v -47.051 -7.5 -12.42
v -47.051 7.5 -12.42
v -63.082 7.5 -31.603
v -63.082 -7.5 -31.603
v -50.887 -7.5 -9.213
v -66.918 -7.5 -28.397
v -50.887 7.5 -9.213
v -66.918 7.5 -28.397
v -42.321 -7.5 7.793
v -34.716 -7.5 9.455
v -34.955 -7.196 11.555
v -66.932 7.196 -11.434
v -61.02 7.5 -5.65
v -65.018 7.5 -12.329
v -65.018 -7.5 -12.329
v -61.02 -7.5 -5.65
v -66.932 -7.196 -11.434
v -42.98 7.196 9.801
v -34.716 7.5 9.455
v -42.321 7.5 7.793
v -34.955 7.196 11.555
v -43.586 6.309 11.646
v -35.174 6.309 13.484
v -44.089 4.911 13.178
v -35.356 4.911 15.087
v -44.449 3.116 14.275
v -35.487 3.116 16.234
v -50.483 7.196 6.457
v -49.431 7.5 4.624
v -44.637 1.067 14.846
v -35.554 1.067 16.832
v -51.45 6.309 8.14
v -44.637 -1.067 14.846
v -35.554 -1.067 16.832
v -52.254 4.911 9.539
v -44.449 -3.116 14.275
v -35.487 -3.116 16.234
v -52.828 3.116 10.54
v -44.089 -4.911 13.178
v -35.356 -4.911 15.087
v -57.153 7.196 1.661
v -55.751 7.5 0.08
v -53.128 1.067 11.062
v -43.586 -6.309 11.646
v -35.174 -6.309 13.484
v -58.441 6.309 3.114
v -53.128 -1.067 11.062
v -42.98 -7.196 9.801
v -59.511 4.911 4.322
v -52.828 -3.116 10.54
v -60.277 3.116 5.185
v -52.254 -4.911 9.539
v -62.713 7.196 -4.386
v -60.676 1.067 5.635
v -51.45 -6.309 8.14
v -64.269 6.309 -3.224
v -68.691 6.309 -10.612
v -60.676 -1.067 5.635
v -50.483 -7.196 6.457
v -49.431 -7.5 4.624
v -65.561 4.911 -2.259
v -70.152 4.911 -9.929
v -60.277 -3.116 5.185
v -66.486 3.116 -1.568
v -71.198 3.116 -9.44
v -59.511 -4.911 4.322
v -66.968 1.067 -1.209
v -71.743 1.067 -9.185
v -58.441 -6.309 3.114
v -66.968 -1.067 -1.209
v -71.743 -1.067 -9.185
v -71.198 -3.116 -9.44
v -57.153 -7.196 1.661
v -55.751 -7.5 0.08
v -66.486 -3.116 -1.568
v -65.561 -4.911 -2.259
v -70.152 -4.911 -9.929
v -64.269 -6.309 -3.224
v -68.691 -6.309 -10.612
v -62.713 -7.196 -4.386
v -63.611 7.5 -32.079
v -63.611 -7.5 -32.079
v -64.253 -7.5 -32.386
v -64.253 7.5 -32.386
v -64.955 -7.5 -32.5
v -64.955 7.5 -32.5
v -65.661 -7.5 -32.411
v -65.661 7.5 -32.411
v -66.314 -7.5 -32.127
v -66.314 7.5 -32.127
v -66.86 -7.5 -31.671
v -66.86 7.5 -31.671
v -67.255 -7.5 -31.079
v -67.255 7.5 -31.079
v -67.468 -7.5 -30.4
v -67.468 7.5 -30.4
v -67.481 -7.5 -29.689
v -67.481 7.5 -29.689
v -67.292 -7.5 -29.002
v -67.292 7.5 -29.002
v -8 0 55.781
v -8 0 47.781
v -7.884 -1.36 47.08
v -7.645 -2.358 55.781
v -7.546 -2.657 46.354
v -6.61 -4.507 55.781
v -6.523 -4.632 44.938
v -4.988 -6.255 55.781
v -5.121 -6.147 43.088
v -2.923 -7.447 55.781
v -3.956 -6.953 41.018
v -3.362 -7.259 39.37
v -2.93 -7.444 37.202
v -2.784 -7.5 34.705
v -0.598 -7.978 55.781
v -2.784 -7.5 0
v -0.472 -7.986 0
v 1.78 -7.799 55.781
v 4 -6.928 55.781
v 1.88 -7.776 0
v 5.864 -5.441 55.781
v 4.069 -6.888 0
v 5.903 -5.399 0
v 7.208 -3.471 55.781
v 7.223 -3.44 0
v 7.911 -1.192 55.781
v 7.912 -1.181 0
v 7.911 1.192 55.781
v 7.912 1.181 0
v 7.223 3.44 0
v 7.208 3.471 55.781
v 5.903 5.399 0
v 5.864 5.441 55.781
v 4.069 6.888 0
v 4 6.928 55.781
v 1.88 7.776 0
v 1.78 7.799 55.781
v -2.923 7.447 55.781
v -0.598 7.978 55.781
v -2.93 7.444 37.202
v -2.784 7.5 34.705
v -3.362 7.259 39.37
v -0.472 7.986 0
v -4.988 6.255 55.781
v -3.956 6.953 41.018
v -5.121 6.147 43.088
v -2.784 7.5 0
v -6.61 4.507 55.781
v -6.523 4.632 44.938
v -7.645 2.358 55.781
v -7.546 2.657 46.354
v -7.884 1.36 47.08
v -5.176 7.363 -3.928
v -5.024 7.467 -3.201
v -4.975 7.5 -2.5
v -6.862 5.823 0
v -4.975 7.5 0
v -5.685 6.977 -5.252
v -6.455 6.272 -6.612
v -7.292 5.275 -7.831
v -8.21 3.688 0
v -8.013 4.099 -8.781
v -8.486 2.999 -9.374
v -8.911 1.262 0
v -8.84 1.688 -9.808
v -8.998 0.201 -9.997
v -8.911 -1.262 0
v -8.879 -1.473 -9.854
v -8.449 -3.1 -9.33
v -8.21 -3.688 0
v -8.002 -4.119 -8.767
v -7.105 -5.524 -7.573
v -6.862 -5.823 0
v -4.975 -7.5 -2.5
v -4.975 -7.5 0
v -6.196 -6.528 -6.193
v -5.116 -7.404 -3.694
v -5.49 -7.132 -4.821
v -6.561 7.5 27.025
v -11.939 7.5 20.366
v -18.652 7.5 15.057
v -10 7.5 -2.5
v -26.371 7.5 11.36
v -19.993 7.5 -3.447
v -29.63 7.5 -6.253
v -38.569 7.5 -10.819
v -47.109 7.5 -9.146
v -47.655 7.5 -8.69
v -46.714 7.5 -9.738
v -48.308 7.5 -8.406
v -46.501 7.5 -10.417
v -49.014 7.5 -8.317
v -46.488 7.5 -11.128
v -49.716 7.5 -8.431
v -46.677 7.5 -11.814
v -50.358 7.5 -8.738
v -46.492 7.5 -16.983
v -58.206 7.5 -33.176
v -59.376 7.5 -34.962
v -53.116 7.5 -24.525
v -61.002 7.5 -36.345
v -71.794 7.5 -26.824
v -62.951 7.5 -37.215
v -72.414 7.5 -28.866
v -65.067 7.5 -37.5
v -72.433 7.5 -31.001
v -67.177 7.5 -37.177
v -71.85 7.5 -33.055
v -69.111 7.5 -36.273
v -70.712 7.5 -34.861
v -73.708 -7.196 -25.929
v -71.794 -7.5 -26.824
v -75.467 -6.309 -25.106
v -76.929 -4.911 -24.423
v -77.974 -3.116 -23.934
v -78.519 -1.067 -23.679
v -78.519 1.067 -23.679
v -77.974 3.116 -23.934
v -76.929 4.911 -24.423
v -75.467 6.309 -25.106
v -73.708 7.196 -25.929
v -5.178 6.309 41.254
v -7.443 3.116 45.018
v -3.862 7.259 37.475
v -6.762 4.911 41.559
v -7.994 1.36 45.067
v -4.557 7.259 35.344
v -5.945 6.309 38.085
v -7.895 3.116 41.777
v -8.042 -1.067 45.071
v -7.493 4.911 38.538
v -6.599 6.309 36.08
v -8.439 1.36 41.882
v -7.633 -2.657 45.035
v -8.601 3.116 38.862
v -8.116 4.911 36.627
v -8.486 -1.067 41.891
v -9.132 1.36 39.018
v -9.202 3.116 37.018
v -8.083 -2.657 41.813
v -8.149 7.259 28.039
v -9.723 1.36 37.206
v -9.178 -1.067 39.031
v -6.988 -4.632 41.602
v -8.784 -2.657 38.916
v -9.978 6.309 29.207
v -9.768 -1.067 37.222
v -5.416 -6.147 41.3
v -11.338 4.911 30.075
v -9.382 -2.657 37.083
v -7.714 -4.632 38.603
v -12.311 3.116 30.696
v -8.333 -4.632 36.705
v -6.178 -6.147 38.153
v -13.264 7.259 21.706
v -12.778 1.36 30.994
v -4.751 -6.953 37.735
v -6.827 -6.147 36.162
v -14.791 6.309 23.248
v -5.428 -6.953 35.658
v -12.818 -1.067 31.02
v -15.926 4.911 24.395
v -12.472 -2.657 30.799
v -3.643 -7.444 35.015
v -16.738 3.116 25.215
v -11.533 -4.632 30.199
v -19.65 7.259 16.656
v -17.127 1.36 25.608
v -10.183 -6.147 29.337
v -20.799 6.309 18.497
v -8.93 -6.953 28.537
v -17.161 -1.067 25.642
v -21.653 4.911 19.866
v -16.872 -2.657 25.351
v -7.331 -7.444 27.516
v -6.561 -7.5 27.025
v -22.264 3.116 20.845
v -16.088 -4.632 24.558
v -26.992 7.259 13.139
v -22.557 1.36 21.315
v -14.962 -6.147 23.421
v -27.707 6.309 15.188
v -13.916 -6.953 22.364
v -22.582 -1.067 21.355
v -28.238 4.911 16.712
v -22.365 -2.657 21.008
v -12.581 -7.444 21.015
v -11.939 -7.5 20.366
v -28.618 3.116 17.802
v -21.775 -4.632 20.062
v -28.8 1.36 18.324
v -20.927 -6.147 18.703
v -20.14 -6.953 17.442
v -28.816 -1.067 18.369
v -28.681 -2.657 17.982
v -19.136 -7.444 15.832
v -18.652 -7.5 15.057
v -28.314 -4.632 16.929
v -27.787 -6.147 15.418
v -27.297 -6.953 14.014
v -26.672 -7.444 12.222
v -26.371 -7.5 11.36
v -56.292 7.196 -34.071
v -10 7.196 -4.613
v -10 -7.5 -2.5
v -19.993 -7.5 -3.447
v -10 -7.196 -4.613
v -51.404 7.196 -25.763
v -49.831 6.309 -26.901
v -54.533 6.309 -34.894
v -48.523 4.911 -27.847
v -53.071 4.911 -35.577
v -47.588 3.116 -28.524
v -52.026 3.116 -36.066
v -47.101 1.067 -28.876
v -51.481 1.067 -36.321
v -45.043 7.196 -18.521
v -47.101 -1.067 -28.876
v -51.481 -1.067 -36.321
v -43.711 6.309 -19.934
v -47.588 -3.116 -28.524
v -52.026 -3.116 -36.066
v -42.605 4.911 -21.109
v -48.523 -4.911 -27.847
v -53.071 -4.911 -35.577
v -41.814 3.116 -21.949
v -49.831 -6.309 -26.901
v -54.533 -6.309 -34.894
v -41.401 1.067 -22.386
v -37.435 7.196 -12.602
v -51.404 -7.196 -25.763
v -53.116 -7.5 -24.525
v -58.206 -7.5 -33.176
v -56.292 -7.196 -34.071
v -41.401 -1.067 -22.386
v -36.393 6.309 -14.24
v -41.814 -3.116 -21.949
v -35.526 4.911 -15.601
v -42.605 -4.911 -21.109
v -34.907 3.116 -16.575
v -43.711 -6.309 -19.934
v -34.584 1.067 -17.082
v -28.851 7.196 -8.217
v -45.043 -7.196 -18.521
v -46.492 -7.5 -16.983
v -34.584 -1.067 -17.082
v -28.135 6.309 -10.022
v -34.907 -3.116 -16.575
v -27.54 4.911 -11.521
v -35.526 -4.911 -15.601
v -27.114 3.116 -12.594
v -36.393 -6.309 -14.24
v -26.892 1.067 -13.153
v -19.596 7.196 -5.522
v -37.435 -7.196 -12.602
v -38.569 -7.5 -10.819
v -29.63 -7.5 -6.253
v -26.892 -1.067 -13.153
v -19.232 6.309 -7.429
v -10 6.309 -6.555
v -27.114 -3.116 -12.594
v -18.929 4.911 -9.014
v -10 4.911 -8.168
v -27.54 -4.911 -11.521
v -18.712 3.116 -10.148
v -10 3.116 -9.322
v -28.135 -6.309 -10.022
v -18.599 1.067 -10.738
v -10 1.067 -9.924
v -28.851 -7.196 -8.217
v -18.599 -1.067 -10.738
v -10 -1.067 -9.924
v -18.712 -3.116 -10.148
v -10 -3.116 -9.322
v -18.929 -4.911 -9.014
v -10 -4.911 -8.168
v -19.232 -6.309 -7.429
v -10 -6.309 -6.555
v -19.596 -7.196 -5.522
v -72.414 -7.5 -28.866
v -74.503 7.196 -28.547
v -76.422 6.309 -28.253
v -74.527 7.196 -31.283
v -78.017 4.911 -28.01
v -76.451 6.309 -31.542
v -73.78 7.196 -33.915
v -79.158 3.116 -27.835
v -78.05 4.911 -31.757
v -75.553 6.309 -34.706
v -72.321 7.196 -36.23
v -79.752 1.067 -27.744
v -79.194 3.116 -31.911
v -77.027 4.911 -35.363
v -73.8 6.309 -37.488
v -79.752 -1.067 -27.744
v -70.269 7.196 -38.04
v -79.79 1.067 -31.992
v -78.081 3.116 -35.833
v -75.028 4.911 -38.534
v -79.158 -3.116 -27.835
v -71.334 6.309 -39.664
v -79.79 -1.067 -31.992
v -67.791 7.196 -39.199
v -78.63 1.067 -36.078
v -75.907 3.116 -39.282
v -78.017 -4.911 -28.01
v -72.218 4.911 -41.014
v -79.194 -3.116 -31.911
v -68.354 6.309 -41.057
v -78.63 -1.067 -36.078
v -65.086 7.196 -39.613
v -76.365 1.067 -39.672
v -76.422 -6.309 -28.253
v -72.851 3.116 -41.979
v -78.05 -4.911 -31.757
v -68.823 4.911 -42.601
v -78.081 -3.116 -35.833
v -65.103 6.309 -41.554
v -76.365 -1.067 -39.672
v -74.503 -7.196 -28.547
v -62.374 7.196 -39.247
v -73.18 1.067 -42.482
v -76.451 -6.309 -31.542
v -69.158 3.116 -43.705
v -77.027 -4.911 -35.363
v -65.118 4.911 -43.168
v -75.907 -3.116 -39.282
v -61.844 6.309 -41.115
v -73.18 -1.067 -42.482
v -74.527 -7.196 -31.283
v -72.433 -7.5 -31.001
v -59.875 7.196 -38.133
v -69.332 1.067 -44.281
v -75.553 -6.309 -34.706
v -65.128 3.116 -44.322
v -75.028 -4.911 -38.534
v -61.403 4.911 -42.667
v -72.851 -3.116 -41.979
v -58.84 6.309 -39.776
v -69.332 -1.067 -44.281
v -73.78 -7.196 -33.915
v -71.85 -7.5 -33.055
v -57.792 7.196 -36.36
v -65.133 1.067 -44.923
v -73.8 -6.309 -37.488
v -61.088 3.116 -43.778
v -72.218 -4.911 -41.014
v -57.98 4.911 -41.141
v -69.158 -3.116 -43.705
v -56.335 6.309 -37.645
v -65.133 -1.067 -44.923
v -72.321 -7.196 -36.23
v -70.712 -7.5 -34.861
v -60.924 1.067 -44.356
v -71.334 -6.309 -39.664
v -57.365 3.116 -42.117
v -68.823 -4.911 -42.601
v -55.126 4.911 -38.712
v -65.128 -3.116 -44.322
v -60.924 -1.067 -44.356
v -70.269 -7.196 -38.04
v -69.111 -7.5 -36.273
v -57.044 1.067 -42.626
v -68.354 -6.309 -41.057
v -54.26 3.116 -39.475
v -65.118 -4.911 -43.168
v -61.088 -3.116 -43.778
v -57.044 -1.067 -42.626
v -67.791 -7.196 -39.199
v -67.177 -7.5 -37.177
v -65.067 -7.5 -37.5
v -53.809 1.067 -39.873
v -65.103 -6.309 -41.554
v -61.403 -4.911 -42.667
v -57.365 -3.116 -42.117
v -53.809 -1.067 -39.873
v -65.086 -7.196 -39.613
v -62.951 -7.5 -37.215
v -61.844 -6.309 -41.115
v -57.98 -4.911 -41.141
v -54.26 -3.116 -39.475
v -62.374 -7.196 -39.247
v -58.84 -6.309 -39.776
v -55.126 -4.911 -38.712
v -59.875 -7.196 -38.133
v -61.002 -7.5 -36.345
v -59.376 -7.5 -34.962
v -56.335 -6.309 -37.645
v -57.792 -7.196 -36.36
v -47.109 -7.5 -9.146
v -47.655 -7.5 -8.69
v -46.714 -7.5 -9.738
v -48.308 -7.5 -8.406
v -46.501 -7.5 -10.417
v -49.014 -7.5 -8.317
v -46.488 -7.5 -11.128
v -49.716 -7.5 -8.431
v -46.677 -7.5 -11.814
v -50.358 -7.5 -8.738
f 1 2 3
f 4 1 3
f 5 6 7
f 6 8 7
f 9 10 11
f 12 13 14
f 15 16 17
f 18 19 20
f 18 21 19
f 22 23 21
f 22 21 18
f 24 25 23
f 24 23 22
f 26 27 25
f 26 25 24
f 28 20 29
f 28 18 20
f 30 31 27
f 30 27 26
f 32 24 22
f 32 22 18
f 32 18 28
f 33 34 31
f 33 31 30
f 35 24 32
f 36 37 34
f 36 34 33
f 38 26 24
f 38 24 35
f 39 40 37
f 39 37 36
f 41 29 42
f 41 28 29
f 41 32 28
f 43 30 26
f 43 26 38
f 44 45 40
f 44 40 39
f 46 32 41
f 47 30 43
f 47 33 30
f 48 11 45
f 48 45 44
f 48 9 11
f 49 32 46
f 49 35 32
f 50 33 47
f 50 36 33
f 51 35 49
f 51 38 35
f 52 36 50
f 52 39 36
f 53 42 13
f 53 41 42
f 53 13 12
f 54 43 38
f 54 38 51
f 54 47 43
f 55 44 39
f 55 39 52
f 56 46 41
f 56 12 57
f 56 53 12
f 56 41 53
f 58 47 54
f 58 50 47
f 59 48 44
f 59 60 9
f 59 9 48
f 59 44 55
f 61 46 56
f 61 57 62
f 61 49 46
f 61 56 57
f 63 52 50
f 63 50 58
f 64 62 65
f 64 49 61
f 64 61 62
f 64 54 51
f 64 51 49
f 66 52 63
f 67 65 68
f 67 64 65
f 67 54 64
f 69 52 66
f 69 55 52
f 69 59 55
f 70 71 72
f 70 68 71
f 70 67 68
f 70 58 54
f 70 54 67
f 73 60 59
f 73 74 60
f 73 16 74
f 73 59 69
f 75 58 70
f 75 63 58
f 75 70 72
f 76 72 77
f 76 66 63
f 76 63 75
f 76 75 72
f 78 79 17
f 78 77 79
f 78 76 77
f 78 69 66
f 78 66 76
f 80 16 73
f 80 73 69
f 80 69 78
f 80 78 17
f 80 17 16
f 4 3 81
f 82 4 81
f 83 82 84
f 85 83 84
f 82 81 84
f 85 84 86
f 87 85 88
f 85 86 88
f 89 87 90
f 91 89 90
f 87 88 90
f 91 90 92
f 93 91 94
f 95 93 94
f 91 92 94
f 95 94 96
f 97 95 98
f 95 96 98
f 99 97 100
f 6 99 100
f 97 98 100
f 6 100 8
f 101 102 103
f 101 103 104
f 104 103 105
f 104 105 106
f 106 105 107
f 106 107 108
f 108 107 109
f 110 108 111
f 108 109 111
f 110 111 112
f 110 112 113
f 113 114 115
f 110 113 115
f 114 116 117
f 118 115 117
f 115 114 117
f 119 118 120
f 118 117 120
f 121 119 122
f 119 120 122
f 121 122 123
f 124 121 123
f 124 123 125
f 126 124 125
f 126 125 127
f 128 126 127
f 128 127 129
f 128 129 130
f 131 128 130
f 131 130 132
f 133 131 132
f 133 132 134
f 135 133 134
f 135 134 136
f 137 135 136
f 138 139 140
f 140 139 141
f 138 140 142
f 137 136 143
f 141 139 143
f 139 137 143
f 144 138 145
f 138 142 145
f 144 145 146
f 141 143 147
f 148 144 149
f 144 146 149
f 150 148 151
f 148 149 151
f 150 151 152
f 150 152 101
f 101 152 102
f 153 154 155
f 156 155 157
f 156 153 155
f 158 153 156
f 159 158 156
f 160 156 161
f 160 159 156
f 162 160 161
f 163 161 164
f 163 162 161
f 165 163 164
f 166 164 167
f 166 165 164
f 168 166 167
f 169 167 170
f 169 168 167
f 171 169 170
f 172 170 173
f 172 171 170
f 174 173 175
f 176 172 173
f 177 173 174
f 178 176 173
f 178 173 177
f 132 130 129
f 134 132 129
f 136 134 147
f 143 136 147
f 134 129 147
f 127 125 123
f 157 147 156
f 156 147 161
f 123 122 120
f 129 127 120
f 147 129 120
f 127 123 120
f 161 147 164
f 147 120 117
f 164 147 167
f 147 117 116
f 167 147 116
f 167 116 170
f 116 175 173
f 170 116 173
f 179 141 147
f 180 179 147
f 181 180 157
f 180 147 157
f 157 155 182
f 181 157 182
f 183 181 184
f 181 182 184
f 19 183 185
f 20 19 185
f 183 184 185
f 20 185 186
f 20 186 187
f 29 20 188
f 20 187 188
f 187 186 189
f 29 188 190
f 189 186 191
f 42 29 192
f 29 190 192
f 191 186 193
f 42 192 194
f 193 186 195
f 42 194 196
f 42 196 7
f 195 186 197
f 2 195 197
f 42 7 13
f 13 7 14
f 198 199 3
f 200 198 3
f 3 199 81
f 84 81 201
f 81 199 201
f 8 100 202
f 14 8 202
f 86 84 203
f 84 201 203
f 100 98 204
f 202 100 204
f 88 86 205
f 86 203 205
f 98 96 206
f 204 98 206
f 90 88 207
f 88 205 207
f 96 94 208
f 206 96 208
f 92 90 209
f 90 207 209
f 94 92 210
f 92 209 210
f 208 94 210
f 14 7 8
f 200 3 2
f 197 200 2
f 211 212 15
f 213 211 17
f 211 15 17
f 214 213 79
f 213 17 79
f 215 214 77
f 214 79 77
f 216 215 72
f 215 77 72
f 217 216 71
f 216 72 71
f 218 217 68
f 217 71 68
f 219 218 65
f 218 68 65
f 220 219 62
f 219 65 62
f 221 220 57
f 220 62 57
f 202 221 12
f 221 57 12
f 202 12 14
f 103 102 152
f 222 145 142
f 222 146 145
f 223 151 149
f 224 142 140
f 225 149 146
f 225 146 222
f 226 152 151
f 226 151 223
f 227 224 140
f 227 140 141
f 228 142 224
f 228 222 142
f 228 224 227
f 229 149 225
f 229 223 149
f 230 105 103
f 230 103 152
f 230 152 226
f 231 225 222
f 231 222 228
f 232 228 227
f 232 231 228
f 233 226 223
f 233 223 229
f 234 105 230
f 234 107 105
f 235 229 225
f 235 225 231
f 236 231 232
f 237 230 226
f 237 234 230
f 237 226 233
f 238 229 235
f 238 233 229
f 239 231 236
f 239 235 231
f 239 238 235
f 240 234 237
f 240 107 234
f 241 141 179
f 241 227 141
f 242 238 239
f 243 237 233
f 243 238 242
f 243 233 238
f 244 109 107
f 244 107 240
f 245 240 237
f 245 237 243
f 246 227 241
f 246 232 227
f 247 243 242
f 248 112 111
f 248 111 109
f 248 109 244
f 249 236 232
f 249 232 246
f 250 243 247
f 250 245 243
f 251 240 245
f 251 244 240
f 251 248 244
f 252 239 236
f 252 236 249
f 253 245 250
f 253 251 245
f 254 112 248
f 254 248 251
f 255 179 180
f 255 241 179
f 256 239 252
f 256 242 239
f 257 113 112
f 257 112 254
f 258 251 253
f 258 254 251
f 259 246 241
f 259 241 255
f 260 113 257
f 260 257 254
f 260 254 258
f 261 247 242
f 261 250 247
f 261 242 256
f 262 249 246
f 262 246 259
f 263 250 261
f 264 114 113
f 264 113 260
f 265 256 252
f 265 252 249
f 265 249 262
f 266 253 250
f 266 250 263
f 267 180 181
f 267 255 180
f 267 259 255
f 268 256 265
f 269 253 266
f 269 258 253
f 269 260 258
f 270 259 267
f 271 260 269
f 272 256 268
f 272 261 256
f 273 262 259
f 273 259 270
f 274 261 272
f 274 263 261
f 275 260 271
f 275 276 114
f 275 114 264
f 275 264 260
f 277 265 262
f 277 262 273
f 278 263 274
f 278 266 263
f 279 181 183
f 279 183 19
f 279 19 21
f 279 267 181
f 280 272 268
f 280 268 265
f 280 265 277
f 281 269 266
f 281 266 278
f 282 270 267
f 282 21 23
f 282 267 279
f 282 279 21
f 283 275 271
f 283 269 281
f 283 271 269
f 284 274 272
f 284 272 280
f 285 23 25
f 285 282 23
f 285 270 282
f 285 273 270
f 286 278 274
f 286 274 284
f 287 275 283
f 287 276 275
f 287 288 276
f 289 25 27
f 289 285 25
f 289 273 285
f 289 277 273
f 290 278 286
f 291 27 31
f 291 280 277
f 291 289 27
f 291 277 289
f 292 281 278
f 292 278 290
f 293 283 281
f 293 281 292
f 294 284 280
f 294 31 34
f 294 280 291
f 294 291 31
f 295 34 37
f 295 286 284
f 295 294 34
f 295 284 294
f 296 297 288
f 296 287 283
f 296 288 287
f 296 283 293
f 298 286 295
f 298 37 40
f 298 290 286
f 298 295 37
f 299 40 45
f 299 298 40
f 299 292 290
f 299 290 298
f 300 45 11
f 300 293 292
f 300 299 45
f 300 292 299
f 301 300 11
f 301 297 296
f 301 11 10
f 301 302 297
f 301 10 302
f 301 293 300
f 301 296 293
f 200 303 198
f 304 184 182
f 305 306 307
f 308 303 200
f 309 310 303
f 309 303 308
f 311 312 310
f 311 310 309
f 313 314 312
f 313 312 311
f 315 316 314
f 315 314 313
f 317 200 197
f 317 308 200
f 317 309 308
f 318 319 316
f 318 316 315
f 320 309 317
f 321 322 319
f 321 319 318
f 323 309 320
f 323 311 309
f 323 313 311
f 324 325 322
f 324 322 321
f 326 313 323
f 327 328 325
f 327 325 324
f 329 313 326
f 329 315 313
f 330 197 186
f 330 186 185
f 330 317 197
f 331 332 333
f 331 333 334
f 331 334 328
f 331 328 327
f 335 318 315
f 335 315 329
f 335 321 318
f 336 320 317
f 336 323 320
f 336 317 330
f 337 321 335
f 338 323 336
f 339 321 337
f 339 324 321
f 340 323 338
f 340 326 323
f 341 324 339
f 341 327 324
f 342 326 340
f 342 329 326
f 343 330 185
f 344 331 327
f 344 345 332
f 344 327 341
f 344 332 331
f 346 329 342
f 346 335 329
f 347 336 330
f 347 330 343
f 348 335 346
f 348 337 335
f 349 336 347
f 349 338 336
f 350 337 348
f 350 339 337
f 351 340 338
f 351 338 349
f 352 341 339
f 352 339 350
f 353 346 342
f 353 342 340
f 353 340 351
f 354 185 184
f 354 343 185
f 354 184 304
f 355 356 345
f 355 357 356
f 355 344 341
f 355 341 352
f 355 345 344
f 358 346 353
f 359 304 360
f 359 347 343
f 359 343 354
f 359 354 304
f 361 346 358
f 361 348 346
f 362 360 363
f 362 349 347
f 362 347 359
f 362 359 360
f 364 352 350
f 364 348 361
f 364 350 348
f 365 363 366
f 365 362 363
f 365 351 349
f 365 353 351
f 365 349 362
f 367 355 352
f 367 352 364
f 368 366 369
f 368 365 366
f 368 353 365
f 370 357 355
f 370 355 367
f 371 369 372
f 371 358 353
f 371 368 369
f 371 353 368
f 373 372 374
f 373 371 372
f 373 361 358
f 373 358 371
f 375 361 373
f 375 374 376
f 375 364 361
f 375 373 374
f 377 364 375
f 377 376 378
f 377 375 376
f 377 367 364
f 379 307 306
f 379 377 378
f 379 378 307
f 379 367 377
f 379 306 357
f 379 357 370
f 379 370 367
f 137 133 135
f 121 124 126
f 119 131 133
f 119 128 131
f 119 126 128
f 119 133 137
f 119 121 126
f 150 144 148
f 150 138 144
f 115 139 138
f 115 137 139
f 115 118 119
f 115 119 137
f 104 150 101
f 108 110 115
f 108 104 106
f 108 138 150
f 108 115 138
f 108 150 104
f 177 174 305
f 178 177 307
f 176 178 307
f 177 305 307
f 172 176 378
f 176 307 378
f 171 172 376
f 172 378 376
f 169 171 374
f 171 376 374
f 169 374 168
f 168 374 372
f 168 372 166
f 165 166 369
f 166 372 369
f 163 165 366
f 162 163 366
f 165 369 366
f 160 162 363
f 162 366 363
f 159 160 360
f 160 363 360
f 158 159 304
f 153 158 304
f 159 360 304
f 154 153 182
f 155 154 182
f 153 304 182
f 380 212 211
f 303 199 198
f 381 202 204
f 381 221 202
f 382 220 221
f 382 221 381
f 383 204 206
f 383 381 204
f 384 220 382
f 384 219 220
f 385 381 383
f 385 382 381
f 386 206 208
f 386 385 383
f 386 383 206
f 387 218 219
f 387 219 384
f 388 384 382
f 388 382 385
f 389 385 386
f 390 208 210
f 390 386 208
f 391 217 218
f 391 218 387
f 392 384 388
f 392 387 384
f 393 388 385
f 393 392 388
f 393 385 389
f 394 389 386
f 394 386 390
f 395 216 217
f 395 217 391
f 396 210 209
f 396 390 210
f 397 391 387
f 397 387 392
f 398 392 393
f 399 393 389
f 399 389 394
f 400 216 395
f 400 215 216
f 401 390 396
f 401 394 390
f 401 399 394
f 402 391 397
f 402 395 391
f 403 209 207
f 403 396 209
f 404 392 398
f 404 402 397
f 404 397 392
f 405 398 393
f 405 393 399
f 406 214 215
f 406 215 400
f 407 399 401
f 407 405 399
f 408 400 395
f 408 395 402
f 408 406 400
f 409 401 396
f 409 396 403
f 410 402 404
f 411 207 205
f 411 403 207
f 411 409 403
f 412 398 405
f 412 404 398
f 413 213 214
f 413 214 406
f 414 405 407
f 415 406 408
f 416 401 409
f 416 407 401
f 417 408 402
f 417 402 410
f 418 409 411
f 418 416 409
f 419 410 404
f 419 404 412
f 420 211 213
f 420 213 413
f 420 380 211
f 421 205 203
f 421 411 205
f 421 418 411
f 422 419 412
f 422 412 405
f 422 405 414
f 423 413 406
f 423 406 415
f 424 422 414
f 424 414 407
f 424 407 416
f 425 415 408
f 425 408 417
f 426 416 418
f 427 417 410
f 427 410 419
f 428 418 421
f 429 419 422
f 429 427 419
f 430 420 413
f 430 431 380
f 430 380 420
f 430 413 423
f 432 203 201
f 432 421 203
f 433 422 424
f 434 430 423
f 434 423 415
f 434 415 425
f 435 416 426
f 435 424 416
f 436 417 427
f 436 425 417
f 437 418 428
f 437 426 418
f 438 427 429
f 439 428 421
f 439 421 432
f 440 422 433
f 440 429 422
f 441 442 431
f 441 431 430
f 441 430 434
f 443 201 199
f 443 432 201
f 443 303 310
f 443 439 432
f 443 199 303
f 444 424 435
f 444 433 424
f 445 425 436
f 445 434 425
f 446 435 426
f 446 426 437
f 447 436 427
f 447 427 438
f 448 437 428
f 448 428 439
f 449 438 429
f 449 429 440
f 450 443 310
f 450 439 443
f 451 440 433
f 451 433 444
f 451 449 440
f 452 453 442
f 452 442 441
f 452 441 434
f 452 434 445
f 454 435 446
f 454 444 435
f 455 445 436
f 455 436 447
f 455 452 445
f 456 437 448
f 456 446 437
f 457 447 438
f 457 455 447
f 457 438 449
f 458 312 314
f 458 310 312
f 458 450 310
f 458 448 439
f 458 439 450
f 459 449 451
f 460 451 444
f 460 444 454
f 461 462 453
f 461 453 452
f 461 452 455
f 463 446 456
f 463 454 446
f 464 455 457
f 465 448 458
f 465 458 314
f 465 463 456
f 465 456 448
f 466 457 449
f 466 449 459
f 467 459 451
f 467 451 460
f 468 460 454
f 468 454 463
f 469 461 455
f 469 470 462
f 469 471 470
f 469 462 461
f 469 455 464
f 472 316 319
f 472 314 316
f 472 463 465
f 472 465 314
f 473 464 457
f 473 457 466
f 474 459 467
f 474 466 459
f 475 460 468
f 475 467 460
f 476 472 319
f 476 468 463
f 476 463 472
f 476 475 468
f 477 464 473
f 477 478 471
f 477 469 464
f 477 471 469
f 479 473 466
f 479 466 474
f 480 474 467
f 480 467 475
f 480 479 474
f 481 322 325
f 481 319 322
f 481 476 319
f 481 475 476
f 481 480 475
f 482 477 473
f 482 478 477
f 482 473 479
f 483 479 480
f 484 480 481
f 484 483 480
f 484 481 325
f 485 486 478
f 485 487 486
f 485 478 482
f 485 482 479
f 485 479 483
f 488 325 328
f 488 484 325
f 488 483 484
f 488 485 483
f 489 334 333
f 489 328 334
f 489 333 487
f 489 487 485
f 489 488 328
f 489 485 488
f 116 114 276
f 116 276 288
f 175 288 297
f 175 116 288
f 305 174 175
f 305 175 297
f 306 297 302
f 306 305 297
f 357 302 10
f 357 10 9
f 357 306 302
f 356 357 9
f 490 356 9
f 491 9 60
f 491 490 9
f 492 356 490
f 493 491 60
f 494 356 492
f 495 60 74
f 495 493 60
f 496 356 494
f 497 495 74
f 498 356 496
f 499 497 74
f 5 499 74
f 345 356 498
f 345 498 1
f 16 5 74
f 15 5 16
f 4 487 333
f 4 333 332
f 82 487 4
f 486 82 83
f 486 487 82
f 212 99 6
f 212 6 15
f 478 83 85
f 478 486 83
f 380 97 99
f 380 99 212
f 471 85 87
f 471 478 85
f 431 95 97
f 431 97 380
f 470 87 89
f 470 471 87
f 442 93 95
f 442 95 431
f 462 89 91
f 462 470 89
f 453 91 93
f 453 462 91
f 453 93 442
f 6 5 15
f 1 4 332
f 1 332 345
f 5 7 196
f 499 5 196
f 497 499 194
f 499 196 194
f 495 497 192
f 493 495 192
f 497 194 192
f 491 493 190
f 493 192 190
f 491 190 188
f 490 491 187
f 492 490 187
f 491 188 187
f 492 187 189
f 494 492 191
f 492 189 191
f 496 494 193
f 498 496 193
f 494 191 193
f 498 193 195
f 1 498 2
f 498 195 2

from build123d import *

# Parameters (mm, degrees)
SKETCH1_R           = 8
BOSS_EXTRUDE1_DEPTH = 55.781202295
BOSS_EXTRUDE2_DEPTH = 7.5
SKETCH4_W           = 9
SKETCH4_H           = 15
FILLET7_R           = 7.5


with BuildPart() as part:
    # Sketch1 → Boss-Extrude1 (new body)
    with BuildSketch(Plane.XY):
        with Locations(Location((0, 0, 0), (0, 0, 180))):
            Circle(SKETCH1_R)
    extrude(amount=BOSS_EXTRUDE1_DEPTH)

    # Sketch2 → Boss-Extrude2 (add, symmetric)
    with BuildSketch(Plane(origin=(0, 0, 0), x_dir=(1, 0, 0), z_dir=(0, 1, 0))):
        with BuildLine():
            Line((0, 0), (0, -47.781202295))
            Line((0, -47.781202295), (-8, -47.781202295))
            ThreePointArc((-8, -47.781202295), (-15.893349065, -27.087541453), (-35.563103488, -16.907496293))
            ThreePointArc((-35.563103488, -16.907496293), (-57.085036764, -8.603159393), (-71.811764706, 9.152941176))
            Line((-71.811764706, 9.152941176), (-78.588235294, 23.647058824))
            ThreePointArc((-78.588235294, 23.647058824), (-71.352941176, 43.588235294), (-51.411764706, 36.352941176))
            ThreePointArc((-51.411764706, 36.352941176), (-34.542879643, 17.146903418), (-10, 10))
            Line((-10, 10), (0, 10))
            Line((0, 10), (0, 0))
        make_face()
        with BuildLine():
            Line((-66.918339779, 28.396886626), (-50.887206037, 9.213488831))
            ThreePointArc((-50.887206037, 9.213488831), (-47.365752883, 8.898262426), (-47.050526478, 12.41971558))
            Line((-47.050526478, 12.41971558), (-63.081660221, 31.603113374))
            ThreePointArc((-63.081660221, 31.603113374), (-66.603113374, 31.918339779), (-66.918339779, 28.396886626))
        make_face(mode=Mode.SUBTRACT)
    extrude(amount=BOSS_EXTRUDE2_DEPTH, both=True)

    # Sketch4 → Cut-Revolve1 (revolve, cut)
    with BuildSketch(Plane(origin=(0, 0, 0), x_dir=(1, 0, 0), z_dir=(0, 1, 0))):
        with Locations((-4.5, -63.281202295)):
            Rectangle(SKETCH4_W, SKETCH4_H)
        with Locations((-4.5, 7.5)):
            Rectangle(SKETCH4_W, SKETCH4_H)
    revolve(axis=Axis((0, 0, 0), (0, 0, 1)), mode=Mode.SUBTRACT)

    # Fillet7
    # the kernel refuses this fillet: 7.5 mm, written as the material it takes off along each edge
    with BuildSketch(Plane(origin=(-10, -7.5, -10), x_dir=(0, 1, 0), z_dir=(1, 0, 0))) as fillet7_piece_1:
        with BuildLine():
            CenterArc((FILLET7_R, FILLET7_R), FILLET7_R, 180, 90)
            Line((0, FILLET7_R), (0, 0))
            Line((0, 0), (FILLET7_R, 0))
        make_face()
    extrude(amount=23.775062814, mode=Mode.SUBTRACT)
    with BuildSketch(Plane(origin=(-10, -7.5, -55.714285714), x_dir=(-0.9058823529411765, 0, 0.423529411764706), z_dir=(-0.423529411764706, 0, -0.9058823529411765))) as fillet7_piece_2:
        with BuildLine():
            CenterArc((45.714285714 + FILLET7_R, FILLET7_R), FILLET7_R, 180, 90)
            Line((45.714285714 + FILLET7_R, 0), (45.714285714, 0))
            Line((45.714285714, 0), (45.714285714, FILLET7_R))
        make_face()
    revolve(axis=Axis((-10, -7.5, -55.714285714), (0, 1, 0)), revolution_arc=64.942384582, mode=Mode.SUBTRACT)
    with BuildSketch(Plane(origin=(-65, -7.5, -30), x_dir=(-0.9058823529411761, 0, 0.42352941176470665), z_dir=(0.42352941176470665, 0, 0.9058823529411761))) as fillet7_piece_3:
        with BuildLine():
            CenterArc((15 - FILLET7_R, -FILLET7_R), FILLET7_R, 0, 90)
            Line((15 - FILLET7_R, 0), (15, 0))
            Line((15, 0), (15, -FILLET7_R))
        make_face()
    revolve(axis=Axis((-65, -7.5, -30), (0, -1, 0)), revolution_arc=180, mode=Mode.SUBTRACT)
    with BuildSketch(Plane(origin=(-71.811764706, -7.5, -9.152941176), x_dir=(0, 1, 0), z_dir=(-0.4235294117647053, 0, -0.9058823529411768))) as fillet7_piece_4:
        with BuildLine():
            CenterArc((FILLET7_R, FILLET7_R), FILLET7_R, 180, 90)
            Line((0, FILLET7_R), (0, 0))
            Line((0, 0), (FILLET7_R, 0))
        make_face()
    extrude(amount=16, mode=Mode.SUBTRACT)
    with BuildSketch(Plane(origin=(-30.4, -7.5, -28.514285714), x_dir=(-0.11294288879485842, 0, 0.9936014814152967), z_dir=(0.9936014814152967, 0, 0.11294288879485842))) as fillet7_piece_5:
        with BuildLine():
            CenterArc((45.714285714 - FILLET7_R, -FILLET7_R), FILLET7_R, 0, 90)
            Line((45.714285714 - FILLET7_R, 0), (45.714285714, 0))
            Line((45.714285714, 0), (45.714285714, -FILLET7_R))
        make_face()
    revolve(axis=Axis((-30.4, -7.5, -28.514285714), (0, -1, 0)), revolution_arc=58.45739638, mode=Mode.SUBTRACT)
    with BuildSketch(Plane(origin=(-10, 7.5, -10), x_dir=(0, -1, 0), z_dir=(1, 0, 0))) as fillet7_piece_6:
        with BuildLine():
            CenterArc((FILLET7_R, -FILLET7_R), FILLET7_R, 90, 90)
            Line((0, -FILLET7_R), (0, 0))
            Line((0, 0), (FILLET7_R, 0))
        make_face()
    extrude(amount=23.775062814, mode=Mode.SUBTRACT)
    with BuildSketch(Plane(origin=(-10, 7.5, -55.714285714), x_dir=(-0.9058823529411765, 0, 0.423529411764706), z_dir=(-0.423529411764706, 0, -0.9058823529411765))) as fillet7_piece_7:
        with BuildLine():
            CenterArc((45.714285714 + FILLET7_R, -FILLET7_R), FILLET7_R, 90, 90)
            Line((45.714285714 + FILLET7_R, 0), (45.714285714, 0))
            Line((45.714285714, 0), (45.714285714, -FILLET7_R))
        make_face()
    revolve(axis=Axis((-10, 7.5, -55.714285714), (0, 1, 0)), revolution_arc=64.942384582, mode=Mode.SUBTRACT)
    with BuildSketch(Plane(origin=(-65, 7.5, -30), x_dir=(-0.9058823529411761, 0, 0.42352941176470665), z_dir=(0.42352941176470665, 0, 0.9058823529411761))) as fillet7_piece_8:
        with BuildLine():
            CenterArc((15 - FILLET7_R, FILLET7_R), FILLET7_R, 270, 90)
            Line((15 - FILLET7_R, 0), (15, 0))
            Line((15, 0), (15, FILLET7_R))
        make_face()
    revolve(axis=Axis((-65, 7.5, -30), (0, -1, 0)), revolution_arc=180, mode=Mode.SUBTRACT)
    with BuildSketch(Plane(origin=(-71.811764706, 7.5, -9.152941176), x_dir=(0, -1, 0), z_dir=(-0.4235294117647053, 0, -0.9058823529411768))) as fillet7_piece_9:
        with BuildLine():
            CenterArc((FILLET7_R, -FILLET7_R), FILLET7_R, 90, 90)
            Line((0, -FILLET7_R), (0, 0))
            Line((0, 0), (FILLET7_R, 0))
        make_face()
    extrude(amount=16, mode=Mode.SUBTRACT)
    with BuildSketch(Plane(origin=(-30.4, 7.5, -28.514285714), x_dir=(-0.11294288879485842, 0, 0.9936014814152967), z_dir=(0.9936014814152967, 0, 0.11294288879485842))) as fillet7_piece_10:
        with BuildLine():
            CenterArc((45.714285714 - FILLET7_R, FILLET7_R), FILLET7_R, 270, 90)
            Line((45.714285714 - FILLET7_R, 0), (45.714285714, 0))
            Line((45.714285714, 0), (45.714285714, FILLET7_R))
        make_face()
    revolve(axis=Axis((-30.4, 7.5, -28.514285714), (0, -1, 0)), revolution_arc=58.45739638, mode=Mode.SUBTRACT)
    with BuildSketch(Plane(origin=(-39.072524125, -7.5, 47.781202295), x_dir=(0.8232772833721975, 0, 0.5676394231228962), z_dir=(-0.5676394231228962, 0, 0.8232772833721975))) as fillet7_piece_11_section:
        with BuildLine():
            CenterArc((31.072524125 + FILLET7_R, FILLET7_R), FILLET7_R, 180, 90)
            Line((31.072524125 + FILLET7_R, 0), (31.072524125, 0))
            Line((31.072524125, 0), (31.072524125, FILLET7_R))
        make_face()
    fillet7_piece_11 = revolve(axis=Axis((-39.072524125, -7.5, 47.781202295), (0, 1, 0)), revolution_arc=118.100790846, mode=Mode.PRIVATE)
    fillet7_piece_11 = fillet7_piece_11 - Plane(origin=(0, 0, 57.650012674), x_dir=(-1, 0, 0), z_dir=(0, 0, -1)) * Cylinder(8, 155, mode=Mode.PRIVATE)
    add(fillet7_piece_11, mode=Mode.SUBTRACT)
    with BuildSketch(Plane(origin=(-39.072524125, 7.5, 47.781202295), x_dir=(0.8232772833721975, 0, 0.5676394231228962), z_dir=(-0.5676394231228962, 0, 0.8232772833721975))) as fillet7_piece_12_section:
        with BuildLine():
            CenterArc((31.072524125 + FILLET7_R, -FILLET7_R), FILLET7_R, 90, 90)
            Line((31.072524125 + FILLET7_R, 0), (31.072524125, 0))
            Line((31.072524125, 0), (31.072524125, -FILLET7_R))
        make_face()
    fillet7_piece_12 = revolve(axis=Axis((-39.072524125, 7.5, 47.781202295), (0, 1, 0)), revolution_arc=118.100790846, mode=Mode.PRIVATE)
    fillet7_piece_12 = fillet7_piece_12 - Plane(origin=(0, 0, 57.650012673), x_dir=(-1, 0, 0), z_dir=(0, 0, -1)) * Cylinder(8, 155, mode=Mode.PRIVATE)
    add(fillet7_piece_12, mode=Mode.SUBTRACT)


solid = part.part
